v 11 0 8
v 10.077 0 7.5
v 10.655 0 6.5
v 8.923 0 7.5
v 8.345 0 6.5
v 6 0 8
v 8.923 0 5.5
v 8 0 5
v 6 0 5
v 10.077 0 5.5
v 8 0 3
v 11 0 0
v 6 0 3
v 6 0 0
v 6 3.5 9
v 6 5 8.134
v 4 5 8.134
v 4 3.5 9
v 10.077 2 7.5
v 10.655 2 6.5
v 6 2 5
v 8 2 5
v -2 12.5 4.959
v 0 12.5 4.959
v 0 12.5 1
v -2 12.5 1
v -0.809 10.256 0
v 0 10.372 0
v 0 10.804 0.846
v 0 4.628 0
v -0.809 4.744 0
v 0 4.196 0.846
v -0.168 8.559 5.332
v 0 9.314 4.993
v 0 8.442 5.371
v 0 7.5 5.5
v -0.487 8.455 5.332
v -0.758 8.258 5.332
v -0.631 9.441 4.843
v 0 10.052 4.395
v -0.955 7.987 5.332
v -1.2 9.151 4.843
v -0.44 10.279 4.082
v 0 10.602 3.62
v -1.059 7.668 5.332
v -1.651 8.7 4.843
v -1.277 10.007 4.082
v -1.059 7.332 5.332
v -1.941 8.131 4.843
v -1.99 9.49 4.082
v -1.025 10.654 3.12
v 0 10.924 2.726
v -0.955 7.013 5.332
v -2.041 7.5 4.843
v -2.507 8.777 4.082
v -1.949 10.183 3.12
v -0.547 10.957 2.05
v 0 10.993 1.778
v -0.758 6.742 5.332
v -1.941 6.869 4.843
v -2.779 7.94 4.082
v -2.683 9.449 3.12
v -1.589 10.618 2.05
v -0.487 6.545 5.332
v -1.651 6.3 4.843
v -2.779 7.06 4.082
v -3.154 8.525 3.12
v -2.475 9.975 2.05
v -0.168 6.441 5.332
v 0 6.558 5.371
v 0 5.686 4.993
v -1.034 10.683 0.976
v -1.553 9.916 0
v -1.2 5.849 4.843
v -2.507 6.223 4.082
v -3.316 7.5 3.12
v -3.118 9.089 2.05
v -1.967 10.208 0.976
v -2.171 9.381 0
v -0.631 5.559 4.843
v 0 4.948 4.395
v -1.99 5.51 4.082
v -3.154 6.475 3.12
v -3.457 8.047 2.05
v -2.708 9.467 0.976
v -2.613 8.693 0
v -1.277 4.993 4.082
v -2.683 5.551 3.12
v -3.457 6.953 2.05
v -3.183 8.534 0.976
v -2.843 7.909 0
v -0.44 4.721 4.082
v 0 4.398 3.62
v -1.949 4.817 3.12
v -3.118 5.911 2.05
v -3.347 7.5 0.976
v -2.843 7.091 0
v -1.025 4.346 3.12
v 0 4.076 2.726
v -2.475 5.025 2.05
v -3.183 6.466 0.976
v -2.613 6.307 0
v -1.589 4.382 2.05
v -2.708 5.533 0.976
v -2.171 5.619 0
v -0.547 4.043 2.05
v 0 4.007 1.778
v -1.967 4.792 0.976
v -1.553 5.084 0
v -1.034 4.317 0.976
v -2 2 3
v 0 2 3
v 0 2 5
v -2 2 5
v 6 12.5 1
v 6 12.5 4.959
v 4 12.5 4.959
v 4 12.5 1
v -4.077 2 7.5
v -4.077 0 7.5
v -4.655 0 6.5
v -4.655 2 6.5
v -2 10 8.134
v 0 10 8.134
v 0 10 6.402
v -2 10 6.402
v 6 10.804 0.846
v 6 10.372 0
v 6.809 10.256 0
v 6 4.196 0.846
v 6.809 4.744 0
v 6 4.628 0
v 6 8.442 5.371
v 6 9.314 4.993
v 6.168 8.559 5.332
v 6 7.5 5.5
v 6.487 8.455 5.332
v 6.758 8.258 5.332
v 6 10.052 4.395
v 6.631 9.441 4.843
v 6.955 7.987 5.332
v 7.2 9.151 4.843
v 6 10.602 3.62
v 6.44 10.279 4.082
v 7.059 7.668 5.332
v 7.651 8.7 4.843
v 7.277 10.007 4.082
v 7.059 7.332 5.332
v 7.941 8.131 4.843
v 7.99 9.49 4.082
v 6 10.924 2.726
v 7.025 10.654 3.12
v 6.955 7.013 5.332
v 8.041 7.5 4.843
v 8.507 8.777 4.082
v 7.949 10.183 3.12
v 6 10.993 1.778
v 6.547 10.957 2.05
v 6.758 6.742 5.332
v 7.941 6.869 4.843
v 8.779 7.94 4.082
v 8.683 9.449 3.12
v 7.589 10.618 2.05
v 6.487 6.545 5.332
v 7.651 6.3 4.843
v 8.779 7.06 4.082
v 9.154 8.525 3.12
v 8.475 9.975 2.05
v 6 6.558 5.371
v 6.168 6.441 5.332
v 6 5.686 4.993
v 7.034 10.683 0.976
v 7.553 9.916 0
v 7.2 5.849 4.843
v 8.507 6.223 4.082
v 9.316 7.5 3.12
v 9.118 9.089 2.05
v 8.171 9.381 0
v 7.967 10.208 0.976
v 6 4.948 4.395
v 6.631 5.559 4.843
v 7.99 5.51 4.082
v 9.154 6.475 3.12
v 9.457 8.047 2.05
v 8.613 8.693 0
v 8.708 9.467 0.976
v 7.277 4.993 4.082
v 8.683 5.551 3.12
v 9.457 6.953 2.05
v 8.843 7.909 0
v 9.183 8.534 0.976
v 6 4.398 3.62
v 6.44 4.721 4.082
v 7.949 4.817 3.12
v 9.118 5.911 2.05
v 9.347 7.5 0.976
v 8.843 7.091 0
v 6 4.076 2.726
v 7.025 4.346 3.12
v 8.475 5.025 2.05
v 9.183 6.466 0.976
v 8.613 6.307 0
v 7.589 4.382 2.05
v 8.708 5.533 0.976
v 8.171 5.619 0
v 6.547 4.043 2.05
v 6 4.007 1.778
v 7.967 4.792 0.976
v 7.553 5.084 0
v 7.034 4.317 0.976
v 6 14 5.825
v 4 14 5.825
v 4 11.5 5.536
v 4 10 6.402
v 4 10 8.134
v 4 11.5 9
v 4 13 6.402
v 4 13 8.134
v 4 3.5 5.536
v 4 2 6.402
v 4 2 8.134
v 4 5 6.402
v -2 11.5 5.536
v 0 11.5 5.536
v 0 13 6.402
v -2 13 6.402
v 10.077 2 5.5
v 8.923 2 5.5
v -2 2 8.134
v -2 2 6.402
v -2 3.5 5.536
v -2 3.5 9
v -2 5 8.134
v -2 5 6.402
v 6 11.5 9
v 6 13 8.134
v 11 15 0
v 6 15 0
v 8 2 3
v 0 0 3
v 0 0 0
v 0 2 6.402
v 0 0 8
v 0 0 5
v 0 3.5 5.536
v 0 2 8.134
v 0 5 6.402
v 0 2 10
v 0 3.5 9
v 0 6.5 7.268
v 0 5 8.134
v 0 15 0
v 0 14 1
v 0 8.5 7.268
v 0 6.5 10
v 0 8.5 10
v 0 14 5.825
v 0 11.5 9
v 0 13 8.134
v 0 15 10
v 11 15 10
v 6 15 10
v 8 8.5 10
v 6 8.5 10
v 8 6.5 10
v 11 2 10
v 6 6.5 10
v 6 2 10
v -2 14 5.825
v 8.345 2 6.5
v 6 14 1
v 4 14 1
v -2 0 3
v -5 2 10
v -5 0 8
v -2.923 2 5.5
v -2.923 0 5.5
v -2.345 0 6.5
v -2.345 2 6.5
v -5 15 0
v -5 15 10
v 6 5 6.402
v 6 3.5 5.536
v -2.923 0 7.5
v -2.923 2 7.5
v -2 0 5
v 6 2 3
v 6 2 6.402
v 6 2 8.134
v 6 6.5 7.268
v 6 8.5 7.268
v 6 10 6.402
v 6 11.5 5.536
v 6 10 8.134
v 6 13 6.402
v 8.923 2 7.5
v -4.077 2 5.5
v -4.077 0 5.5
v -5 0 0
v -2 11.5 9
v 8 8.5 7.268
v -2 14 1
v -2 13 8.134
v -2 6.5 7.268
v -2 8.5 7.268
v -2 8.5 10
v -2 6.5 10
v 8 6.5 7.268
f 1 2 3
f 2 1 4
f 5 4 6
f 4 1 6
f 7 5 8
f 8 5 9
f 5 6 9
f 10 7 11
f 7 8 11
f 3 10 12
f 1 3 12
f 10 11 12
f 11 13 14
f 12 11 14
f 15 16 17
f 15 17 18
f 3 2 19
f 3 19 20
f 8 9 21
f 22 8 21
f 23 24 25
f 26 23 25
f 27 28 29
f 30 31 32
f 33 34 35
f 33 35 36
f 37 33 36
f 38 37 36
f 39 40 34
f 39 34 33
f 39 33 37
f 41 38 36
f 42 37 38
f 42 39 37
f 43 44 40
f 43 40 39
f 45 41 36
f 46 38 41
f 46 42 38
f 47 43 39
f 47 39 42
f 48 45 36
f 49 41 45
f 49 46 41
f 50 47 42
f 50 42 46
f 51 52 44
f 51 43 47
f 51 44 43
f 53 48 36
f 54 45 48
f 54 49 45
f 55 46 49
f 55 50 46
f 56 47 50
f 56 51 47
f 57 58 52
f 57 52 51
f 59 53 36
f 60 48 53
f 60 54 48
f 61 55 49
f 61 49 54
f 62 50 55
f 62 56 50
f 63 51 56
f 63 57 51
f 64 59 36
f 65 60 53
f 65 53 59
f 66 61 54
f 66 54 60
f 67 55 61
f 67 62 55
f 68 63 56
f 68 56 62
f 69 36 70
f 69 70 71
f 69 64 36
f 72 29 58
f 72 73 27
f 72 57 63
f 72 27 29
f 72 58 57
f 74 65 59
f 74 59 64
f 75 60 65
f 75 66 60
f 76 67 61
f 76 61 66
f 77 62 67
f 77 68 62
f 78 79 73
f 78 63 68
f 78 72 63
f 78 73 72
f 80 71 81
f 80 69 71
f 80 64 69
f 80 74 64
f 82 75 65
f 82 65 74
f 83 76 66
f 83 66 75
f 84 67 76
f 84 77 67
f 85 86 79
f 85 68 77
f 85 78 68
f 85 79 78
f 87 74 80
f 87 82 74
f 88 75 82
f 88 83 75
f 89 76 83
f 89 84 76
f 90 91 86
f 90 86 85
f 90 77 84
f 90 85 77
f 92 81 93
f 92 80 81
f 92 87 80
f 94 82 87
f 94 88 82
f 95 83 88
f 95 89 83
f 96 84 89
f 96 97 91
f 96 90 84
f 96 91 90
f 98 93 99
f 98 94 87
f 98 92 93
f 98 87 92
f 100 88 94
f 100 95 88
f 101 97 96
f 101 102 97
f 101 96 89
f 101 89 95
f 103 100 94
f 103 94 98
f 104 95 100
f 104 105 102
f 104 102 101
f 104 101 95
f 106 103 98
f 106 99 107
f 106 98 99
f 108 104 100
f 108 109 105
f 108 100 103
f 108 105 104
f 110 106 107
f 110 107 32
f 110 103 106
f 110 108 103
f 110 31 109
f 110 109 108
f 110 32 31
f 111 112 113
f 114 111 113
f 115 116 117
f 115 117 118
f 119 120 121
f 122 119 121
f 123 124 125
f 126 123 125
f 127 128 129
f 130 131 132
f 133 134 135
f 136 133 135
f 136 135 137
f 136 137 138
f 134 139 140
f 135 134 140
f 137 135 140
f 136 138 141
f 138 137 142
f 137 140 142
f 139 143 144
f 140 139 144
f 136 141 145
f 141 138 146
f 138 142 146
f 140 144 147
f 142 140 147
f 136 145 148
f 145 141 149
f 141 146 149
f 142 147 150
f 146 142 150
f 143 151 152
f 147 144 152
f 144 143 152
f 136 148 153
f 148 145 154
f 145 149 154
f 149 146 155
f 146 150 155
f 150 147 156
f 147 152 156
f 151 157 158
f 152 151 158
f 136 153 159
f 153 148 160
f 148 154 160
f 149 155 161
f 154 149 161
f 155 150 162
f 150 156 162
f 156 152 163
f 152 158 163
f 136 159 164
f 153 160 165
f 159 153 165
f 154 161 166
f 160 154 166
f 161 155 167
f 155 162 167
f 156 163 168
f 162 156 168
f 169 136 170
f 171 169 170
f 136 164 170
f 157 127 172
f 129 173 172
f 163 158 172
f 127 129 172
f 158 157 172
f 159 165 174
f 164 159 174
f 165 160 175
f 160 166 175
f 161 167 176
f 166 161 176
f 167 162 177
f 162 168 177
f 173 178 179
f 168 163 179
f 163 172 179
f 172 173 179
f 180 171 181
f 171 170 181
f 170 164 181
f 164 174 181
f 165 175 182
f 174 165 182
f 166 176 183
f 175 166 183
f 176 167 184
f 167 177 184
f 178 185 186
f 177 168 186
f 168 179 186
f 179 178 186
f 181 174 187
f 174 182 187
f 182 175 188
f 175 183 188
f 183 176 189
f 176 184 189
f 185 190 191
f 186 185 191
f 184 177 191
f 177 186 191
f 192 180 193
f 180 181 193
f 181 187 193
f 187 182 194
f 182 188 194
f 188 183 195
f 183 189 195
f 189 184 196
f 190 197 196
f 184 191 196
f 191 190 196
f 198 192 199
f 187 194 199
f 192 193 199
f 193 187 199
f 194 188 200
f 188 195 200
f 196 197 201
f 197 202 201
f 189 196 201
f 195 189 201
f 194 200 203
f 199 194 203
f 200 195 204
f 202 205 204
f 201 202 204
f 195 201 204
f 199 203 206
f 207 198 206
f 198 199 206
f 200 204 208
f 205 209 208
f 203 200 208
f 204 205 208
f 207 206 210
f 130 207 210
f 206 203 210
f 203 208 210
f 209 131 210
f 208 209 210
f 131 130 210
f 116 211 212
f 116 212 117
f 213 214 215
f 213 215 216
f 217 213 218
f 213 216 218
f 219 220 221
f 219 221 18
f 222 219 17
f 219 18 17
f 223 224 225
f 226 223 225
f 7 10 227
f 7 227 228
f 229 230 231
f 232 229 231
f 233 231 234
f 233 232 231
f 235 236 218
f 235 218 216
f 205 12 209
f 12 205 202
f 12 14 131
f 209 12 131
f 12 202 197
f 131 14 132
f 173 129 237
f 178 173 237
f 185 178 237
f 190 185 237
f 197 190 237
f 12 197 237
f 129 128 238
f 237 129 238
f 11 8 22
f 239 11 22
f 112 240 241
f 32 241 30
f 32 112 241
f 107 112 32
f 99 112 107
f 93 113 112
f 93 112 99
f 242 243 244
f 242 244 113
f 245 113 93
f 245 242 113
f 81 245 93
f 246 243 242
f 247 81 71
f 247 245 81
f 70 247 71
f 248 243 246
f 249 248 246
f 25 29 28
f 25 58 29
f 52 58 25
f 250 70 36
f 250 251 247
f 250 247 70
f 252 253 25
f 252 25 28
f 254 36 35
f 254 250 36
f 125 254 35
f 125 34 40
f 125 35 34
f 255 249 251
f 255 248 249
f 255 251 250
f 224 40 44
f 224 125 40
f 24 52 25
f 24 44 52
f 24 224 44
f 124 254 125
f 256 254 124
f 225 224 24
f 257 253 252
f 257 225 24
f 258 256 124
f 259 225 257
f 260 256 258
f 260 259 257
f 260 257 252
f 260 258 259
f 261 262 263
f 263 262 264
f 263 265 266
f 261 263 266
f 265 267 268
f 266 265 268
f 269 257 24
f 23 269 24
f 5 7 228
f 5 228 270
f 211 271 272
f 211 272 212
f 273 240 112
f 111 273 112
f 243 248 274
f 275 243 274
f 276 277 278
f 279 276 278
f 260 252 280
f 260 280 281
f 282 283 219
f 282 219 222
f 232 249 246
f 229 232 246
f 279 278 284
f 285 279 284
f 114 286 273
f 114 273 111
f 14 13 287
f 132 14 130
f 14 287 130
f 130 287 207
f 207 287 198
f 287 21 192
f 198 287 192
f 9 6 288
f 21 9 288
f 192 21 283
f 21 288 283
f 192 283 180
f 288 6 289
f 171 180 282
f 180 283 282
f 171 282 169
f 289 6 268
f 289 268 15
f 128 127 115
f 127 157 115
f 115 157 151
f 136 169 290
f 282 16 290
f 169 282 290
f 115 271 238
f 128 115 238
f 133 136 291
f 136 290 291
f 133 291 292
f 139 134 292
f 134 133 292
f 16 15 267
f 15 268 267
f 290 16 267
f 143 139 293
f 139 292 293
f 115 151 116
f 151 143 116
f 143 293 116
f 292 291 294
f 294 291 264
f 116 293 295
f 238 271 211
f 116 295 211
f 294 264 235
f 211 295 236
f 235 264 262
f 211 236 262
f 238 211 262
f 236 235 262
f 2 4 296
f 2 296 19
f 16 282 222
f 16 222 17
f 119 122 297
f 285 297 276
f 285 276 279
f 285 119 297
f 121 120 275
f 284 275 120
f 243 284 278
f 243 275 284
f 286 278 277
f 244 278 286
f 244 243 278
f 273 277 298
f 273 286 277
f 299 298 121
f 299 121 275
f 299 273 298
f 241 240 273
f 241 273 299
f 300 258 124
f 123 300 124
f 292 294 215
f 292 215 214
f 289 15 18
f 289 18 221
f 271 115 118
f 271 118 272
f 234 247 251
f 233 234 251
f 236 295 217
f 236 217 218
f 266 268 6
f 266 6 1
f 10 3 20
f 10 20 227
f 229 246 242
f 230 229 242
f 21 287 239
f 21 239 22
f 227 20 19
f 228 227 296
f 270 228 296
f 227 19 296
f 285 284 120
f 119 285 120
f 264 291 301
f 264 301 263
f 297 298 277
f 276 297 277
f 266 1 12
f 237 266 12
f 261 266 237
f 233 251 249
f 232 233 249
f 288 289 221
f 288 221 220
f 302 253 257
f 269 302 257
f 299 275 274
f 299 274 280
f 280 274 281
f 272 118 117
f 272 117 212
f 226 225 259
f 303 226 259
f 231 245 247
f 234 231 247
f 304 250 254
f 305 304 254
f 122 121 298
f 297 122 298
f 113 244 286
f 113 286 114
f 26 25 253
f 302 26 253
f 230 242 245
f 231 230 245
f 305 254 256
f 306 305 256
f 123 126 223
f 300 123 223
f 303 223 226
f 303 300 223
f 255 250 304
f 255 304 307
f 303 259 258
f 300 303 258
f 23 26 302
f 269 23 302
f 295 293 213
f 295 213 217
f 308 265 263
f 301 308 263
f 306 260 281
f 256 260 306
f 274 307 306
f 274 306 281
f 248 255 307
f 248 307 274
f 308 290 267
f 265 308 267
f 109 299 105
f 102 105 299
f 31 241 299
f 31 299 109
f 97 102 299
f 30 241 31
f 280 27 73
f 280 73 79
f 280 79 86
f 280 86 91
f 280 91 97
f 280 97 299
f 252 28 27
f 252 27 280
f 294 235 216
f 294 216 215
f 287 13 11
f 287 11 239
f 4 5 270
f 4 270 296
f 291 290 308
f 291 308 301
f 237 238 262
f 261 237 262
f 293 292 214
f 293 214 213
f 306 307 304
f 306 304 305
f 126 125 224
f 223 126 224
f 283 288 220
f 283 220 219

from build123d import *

# Parameters (mm, degrees)
F1_DEPTH  = 5
F4_DEPTH  = 2
F5_W      = 2
F5_H      = 2.7320508076
F6_DEPTH  = 2
F7_W      = 2
F7_H      = 2
F8_DEPTH  = 2
F9_SIZE   = 2
F11_DEPTH = 2
F13_DEPTH = 2
F16_DEPTH = 4


with BuildPart() as f1:
    # F0 (on Right) → F1 (new body)
    with BuildSketch(Plane.YZ):
        with BuildLine():
            Line((0, 10), (0, 0))
            Line((0, 0), (4.6277186767, 0))
            ThreePointArc((4.6277186767, 0), (4.3975815885, 3.6201851746), (7.5, 5.5))
            Line((7.5, 5.5), (7.5, 0))
            Line((7.5, 0), (15, 0))
            Line((15, 0), (15, 10))
            Line((15, 10), (0, 10))
        make_face()
        with BuildLine():
            ThreePointArc((7.5, 5.5), (4.3975815885, 3.6201851746), (4.6277186767, 0))
            Line((4.6277186767, 0), (7.5, 0))
            Line((7.5, 0), (7.5, 5.5))
        make_face()
    extrude(amount=-F1_DEPTH)

    # F0 (on Right) → F2 (revolve, cut)
    with BuildSketch(Plane.YZ):
        with BuildLine():
            ThreePointArc((7.5, 5.5), (4.3975815885, 3.6201851746), (4.6277186767, 0))
            Line((4.6277186767, 0), (7.5, 0))
            Line((7.5, 0), (7.5, 5.5))
        make_face()
    revolve(axis=Axis((0, 7.5, 2), (0, 0, 1)), mode=Mode.SUBTRACT)

    # F3 (on face) → F4 (cut)
    with BuildSketch(Plane.YZ):
        Polygon((2, 8.1339745962), (2, 6.4019237886), (3.5, 5.5358983849), (5, 6.4019237886), (5, 8.1339745962), (3.5, 9), align=None)
        Polygon((10, 6.4019237886), (11.5, 5.5358983849), (13, 6.4019237886), (13, 8.1339745962), (11.5, 9), (10, 8.1339745962), align=None)
    extrude(amount=-F4_DEPTH, mode=Mode.SUBTRACT)

    # F5 (on face) → F6 (cut)
    with BuildSketch(Plane.YZ):
        with Locations((7.5, 8.6339745962)):
            Rectangle(F5_W, F5_H)
    extrude(amount=-F6_DEPTH, mode=Mode.SUBTRACT)

    # F7 (on face) → F8 (cut)
    with BuildSketch(Plane.YZ):
        with Locations((1, 4)):
            Rectangle(F7_W, F7_H)
    extrude(amount=-F8_DEPTH, mode=Mode.SUBTRACT)

    # F9
    f9_edges = [f1.edges().sort_by_distance(p)[0] for p in [
        (-2.5, 0, 10),
    ]]
    chamfer(f9_edges, length=F9_SIZE)

    # F10 (on face) → F11 (cut)
    with BuildSketch(Plane.YZ):
        Polygon((12.5, 4.9585481157), (12.5, 1), (14, 1), (14, 5.8245735195), align=None)
    extrude(amount=-F11_DEPTH, mode=Mode.SUBTRACT)

    # F12 (on face) → F13 (cut)
    with BuildSketch(Plane.XZ):
        Polygon((-4.0773502692, 5.5), (-2.9226497308, 5.5), (-2.3452994616, 6.5), (-2.9226497308, 7.5), (-4.0773502692, 7.5), (-4.6547005384, 6.5), align=None)
    extrude(amount=-F13_DEPTH, mode=Mode.SUBTRACT)


with BuildPart() as f15_1:
    # F15: instance of F1
    add(f1.part.mirror(Plane.YZ.offset(3)))

    # F16 (add): faces of the model
    f16_faces = [f15_1.faces().sort_by_distance(p)[0] for p in [
        (8, 3.5, 7.2679491924),
        (8, 11.5, 7.2679491924),
        (8, 13.2746502736, 3.2028963298),
    ]]
    extrude(f16_faces, amount=F16_DEPTH)


solid = Compound([f1.part, f15_1.part])
